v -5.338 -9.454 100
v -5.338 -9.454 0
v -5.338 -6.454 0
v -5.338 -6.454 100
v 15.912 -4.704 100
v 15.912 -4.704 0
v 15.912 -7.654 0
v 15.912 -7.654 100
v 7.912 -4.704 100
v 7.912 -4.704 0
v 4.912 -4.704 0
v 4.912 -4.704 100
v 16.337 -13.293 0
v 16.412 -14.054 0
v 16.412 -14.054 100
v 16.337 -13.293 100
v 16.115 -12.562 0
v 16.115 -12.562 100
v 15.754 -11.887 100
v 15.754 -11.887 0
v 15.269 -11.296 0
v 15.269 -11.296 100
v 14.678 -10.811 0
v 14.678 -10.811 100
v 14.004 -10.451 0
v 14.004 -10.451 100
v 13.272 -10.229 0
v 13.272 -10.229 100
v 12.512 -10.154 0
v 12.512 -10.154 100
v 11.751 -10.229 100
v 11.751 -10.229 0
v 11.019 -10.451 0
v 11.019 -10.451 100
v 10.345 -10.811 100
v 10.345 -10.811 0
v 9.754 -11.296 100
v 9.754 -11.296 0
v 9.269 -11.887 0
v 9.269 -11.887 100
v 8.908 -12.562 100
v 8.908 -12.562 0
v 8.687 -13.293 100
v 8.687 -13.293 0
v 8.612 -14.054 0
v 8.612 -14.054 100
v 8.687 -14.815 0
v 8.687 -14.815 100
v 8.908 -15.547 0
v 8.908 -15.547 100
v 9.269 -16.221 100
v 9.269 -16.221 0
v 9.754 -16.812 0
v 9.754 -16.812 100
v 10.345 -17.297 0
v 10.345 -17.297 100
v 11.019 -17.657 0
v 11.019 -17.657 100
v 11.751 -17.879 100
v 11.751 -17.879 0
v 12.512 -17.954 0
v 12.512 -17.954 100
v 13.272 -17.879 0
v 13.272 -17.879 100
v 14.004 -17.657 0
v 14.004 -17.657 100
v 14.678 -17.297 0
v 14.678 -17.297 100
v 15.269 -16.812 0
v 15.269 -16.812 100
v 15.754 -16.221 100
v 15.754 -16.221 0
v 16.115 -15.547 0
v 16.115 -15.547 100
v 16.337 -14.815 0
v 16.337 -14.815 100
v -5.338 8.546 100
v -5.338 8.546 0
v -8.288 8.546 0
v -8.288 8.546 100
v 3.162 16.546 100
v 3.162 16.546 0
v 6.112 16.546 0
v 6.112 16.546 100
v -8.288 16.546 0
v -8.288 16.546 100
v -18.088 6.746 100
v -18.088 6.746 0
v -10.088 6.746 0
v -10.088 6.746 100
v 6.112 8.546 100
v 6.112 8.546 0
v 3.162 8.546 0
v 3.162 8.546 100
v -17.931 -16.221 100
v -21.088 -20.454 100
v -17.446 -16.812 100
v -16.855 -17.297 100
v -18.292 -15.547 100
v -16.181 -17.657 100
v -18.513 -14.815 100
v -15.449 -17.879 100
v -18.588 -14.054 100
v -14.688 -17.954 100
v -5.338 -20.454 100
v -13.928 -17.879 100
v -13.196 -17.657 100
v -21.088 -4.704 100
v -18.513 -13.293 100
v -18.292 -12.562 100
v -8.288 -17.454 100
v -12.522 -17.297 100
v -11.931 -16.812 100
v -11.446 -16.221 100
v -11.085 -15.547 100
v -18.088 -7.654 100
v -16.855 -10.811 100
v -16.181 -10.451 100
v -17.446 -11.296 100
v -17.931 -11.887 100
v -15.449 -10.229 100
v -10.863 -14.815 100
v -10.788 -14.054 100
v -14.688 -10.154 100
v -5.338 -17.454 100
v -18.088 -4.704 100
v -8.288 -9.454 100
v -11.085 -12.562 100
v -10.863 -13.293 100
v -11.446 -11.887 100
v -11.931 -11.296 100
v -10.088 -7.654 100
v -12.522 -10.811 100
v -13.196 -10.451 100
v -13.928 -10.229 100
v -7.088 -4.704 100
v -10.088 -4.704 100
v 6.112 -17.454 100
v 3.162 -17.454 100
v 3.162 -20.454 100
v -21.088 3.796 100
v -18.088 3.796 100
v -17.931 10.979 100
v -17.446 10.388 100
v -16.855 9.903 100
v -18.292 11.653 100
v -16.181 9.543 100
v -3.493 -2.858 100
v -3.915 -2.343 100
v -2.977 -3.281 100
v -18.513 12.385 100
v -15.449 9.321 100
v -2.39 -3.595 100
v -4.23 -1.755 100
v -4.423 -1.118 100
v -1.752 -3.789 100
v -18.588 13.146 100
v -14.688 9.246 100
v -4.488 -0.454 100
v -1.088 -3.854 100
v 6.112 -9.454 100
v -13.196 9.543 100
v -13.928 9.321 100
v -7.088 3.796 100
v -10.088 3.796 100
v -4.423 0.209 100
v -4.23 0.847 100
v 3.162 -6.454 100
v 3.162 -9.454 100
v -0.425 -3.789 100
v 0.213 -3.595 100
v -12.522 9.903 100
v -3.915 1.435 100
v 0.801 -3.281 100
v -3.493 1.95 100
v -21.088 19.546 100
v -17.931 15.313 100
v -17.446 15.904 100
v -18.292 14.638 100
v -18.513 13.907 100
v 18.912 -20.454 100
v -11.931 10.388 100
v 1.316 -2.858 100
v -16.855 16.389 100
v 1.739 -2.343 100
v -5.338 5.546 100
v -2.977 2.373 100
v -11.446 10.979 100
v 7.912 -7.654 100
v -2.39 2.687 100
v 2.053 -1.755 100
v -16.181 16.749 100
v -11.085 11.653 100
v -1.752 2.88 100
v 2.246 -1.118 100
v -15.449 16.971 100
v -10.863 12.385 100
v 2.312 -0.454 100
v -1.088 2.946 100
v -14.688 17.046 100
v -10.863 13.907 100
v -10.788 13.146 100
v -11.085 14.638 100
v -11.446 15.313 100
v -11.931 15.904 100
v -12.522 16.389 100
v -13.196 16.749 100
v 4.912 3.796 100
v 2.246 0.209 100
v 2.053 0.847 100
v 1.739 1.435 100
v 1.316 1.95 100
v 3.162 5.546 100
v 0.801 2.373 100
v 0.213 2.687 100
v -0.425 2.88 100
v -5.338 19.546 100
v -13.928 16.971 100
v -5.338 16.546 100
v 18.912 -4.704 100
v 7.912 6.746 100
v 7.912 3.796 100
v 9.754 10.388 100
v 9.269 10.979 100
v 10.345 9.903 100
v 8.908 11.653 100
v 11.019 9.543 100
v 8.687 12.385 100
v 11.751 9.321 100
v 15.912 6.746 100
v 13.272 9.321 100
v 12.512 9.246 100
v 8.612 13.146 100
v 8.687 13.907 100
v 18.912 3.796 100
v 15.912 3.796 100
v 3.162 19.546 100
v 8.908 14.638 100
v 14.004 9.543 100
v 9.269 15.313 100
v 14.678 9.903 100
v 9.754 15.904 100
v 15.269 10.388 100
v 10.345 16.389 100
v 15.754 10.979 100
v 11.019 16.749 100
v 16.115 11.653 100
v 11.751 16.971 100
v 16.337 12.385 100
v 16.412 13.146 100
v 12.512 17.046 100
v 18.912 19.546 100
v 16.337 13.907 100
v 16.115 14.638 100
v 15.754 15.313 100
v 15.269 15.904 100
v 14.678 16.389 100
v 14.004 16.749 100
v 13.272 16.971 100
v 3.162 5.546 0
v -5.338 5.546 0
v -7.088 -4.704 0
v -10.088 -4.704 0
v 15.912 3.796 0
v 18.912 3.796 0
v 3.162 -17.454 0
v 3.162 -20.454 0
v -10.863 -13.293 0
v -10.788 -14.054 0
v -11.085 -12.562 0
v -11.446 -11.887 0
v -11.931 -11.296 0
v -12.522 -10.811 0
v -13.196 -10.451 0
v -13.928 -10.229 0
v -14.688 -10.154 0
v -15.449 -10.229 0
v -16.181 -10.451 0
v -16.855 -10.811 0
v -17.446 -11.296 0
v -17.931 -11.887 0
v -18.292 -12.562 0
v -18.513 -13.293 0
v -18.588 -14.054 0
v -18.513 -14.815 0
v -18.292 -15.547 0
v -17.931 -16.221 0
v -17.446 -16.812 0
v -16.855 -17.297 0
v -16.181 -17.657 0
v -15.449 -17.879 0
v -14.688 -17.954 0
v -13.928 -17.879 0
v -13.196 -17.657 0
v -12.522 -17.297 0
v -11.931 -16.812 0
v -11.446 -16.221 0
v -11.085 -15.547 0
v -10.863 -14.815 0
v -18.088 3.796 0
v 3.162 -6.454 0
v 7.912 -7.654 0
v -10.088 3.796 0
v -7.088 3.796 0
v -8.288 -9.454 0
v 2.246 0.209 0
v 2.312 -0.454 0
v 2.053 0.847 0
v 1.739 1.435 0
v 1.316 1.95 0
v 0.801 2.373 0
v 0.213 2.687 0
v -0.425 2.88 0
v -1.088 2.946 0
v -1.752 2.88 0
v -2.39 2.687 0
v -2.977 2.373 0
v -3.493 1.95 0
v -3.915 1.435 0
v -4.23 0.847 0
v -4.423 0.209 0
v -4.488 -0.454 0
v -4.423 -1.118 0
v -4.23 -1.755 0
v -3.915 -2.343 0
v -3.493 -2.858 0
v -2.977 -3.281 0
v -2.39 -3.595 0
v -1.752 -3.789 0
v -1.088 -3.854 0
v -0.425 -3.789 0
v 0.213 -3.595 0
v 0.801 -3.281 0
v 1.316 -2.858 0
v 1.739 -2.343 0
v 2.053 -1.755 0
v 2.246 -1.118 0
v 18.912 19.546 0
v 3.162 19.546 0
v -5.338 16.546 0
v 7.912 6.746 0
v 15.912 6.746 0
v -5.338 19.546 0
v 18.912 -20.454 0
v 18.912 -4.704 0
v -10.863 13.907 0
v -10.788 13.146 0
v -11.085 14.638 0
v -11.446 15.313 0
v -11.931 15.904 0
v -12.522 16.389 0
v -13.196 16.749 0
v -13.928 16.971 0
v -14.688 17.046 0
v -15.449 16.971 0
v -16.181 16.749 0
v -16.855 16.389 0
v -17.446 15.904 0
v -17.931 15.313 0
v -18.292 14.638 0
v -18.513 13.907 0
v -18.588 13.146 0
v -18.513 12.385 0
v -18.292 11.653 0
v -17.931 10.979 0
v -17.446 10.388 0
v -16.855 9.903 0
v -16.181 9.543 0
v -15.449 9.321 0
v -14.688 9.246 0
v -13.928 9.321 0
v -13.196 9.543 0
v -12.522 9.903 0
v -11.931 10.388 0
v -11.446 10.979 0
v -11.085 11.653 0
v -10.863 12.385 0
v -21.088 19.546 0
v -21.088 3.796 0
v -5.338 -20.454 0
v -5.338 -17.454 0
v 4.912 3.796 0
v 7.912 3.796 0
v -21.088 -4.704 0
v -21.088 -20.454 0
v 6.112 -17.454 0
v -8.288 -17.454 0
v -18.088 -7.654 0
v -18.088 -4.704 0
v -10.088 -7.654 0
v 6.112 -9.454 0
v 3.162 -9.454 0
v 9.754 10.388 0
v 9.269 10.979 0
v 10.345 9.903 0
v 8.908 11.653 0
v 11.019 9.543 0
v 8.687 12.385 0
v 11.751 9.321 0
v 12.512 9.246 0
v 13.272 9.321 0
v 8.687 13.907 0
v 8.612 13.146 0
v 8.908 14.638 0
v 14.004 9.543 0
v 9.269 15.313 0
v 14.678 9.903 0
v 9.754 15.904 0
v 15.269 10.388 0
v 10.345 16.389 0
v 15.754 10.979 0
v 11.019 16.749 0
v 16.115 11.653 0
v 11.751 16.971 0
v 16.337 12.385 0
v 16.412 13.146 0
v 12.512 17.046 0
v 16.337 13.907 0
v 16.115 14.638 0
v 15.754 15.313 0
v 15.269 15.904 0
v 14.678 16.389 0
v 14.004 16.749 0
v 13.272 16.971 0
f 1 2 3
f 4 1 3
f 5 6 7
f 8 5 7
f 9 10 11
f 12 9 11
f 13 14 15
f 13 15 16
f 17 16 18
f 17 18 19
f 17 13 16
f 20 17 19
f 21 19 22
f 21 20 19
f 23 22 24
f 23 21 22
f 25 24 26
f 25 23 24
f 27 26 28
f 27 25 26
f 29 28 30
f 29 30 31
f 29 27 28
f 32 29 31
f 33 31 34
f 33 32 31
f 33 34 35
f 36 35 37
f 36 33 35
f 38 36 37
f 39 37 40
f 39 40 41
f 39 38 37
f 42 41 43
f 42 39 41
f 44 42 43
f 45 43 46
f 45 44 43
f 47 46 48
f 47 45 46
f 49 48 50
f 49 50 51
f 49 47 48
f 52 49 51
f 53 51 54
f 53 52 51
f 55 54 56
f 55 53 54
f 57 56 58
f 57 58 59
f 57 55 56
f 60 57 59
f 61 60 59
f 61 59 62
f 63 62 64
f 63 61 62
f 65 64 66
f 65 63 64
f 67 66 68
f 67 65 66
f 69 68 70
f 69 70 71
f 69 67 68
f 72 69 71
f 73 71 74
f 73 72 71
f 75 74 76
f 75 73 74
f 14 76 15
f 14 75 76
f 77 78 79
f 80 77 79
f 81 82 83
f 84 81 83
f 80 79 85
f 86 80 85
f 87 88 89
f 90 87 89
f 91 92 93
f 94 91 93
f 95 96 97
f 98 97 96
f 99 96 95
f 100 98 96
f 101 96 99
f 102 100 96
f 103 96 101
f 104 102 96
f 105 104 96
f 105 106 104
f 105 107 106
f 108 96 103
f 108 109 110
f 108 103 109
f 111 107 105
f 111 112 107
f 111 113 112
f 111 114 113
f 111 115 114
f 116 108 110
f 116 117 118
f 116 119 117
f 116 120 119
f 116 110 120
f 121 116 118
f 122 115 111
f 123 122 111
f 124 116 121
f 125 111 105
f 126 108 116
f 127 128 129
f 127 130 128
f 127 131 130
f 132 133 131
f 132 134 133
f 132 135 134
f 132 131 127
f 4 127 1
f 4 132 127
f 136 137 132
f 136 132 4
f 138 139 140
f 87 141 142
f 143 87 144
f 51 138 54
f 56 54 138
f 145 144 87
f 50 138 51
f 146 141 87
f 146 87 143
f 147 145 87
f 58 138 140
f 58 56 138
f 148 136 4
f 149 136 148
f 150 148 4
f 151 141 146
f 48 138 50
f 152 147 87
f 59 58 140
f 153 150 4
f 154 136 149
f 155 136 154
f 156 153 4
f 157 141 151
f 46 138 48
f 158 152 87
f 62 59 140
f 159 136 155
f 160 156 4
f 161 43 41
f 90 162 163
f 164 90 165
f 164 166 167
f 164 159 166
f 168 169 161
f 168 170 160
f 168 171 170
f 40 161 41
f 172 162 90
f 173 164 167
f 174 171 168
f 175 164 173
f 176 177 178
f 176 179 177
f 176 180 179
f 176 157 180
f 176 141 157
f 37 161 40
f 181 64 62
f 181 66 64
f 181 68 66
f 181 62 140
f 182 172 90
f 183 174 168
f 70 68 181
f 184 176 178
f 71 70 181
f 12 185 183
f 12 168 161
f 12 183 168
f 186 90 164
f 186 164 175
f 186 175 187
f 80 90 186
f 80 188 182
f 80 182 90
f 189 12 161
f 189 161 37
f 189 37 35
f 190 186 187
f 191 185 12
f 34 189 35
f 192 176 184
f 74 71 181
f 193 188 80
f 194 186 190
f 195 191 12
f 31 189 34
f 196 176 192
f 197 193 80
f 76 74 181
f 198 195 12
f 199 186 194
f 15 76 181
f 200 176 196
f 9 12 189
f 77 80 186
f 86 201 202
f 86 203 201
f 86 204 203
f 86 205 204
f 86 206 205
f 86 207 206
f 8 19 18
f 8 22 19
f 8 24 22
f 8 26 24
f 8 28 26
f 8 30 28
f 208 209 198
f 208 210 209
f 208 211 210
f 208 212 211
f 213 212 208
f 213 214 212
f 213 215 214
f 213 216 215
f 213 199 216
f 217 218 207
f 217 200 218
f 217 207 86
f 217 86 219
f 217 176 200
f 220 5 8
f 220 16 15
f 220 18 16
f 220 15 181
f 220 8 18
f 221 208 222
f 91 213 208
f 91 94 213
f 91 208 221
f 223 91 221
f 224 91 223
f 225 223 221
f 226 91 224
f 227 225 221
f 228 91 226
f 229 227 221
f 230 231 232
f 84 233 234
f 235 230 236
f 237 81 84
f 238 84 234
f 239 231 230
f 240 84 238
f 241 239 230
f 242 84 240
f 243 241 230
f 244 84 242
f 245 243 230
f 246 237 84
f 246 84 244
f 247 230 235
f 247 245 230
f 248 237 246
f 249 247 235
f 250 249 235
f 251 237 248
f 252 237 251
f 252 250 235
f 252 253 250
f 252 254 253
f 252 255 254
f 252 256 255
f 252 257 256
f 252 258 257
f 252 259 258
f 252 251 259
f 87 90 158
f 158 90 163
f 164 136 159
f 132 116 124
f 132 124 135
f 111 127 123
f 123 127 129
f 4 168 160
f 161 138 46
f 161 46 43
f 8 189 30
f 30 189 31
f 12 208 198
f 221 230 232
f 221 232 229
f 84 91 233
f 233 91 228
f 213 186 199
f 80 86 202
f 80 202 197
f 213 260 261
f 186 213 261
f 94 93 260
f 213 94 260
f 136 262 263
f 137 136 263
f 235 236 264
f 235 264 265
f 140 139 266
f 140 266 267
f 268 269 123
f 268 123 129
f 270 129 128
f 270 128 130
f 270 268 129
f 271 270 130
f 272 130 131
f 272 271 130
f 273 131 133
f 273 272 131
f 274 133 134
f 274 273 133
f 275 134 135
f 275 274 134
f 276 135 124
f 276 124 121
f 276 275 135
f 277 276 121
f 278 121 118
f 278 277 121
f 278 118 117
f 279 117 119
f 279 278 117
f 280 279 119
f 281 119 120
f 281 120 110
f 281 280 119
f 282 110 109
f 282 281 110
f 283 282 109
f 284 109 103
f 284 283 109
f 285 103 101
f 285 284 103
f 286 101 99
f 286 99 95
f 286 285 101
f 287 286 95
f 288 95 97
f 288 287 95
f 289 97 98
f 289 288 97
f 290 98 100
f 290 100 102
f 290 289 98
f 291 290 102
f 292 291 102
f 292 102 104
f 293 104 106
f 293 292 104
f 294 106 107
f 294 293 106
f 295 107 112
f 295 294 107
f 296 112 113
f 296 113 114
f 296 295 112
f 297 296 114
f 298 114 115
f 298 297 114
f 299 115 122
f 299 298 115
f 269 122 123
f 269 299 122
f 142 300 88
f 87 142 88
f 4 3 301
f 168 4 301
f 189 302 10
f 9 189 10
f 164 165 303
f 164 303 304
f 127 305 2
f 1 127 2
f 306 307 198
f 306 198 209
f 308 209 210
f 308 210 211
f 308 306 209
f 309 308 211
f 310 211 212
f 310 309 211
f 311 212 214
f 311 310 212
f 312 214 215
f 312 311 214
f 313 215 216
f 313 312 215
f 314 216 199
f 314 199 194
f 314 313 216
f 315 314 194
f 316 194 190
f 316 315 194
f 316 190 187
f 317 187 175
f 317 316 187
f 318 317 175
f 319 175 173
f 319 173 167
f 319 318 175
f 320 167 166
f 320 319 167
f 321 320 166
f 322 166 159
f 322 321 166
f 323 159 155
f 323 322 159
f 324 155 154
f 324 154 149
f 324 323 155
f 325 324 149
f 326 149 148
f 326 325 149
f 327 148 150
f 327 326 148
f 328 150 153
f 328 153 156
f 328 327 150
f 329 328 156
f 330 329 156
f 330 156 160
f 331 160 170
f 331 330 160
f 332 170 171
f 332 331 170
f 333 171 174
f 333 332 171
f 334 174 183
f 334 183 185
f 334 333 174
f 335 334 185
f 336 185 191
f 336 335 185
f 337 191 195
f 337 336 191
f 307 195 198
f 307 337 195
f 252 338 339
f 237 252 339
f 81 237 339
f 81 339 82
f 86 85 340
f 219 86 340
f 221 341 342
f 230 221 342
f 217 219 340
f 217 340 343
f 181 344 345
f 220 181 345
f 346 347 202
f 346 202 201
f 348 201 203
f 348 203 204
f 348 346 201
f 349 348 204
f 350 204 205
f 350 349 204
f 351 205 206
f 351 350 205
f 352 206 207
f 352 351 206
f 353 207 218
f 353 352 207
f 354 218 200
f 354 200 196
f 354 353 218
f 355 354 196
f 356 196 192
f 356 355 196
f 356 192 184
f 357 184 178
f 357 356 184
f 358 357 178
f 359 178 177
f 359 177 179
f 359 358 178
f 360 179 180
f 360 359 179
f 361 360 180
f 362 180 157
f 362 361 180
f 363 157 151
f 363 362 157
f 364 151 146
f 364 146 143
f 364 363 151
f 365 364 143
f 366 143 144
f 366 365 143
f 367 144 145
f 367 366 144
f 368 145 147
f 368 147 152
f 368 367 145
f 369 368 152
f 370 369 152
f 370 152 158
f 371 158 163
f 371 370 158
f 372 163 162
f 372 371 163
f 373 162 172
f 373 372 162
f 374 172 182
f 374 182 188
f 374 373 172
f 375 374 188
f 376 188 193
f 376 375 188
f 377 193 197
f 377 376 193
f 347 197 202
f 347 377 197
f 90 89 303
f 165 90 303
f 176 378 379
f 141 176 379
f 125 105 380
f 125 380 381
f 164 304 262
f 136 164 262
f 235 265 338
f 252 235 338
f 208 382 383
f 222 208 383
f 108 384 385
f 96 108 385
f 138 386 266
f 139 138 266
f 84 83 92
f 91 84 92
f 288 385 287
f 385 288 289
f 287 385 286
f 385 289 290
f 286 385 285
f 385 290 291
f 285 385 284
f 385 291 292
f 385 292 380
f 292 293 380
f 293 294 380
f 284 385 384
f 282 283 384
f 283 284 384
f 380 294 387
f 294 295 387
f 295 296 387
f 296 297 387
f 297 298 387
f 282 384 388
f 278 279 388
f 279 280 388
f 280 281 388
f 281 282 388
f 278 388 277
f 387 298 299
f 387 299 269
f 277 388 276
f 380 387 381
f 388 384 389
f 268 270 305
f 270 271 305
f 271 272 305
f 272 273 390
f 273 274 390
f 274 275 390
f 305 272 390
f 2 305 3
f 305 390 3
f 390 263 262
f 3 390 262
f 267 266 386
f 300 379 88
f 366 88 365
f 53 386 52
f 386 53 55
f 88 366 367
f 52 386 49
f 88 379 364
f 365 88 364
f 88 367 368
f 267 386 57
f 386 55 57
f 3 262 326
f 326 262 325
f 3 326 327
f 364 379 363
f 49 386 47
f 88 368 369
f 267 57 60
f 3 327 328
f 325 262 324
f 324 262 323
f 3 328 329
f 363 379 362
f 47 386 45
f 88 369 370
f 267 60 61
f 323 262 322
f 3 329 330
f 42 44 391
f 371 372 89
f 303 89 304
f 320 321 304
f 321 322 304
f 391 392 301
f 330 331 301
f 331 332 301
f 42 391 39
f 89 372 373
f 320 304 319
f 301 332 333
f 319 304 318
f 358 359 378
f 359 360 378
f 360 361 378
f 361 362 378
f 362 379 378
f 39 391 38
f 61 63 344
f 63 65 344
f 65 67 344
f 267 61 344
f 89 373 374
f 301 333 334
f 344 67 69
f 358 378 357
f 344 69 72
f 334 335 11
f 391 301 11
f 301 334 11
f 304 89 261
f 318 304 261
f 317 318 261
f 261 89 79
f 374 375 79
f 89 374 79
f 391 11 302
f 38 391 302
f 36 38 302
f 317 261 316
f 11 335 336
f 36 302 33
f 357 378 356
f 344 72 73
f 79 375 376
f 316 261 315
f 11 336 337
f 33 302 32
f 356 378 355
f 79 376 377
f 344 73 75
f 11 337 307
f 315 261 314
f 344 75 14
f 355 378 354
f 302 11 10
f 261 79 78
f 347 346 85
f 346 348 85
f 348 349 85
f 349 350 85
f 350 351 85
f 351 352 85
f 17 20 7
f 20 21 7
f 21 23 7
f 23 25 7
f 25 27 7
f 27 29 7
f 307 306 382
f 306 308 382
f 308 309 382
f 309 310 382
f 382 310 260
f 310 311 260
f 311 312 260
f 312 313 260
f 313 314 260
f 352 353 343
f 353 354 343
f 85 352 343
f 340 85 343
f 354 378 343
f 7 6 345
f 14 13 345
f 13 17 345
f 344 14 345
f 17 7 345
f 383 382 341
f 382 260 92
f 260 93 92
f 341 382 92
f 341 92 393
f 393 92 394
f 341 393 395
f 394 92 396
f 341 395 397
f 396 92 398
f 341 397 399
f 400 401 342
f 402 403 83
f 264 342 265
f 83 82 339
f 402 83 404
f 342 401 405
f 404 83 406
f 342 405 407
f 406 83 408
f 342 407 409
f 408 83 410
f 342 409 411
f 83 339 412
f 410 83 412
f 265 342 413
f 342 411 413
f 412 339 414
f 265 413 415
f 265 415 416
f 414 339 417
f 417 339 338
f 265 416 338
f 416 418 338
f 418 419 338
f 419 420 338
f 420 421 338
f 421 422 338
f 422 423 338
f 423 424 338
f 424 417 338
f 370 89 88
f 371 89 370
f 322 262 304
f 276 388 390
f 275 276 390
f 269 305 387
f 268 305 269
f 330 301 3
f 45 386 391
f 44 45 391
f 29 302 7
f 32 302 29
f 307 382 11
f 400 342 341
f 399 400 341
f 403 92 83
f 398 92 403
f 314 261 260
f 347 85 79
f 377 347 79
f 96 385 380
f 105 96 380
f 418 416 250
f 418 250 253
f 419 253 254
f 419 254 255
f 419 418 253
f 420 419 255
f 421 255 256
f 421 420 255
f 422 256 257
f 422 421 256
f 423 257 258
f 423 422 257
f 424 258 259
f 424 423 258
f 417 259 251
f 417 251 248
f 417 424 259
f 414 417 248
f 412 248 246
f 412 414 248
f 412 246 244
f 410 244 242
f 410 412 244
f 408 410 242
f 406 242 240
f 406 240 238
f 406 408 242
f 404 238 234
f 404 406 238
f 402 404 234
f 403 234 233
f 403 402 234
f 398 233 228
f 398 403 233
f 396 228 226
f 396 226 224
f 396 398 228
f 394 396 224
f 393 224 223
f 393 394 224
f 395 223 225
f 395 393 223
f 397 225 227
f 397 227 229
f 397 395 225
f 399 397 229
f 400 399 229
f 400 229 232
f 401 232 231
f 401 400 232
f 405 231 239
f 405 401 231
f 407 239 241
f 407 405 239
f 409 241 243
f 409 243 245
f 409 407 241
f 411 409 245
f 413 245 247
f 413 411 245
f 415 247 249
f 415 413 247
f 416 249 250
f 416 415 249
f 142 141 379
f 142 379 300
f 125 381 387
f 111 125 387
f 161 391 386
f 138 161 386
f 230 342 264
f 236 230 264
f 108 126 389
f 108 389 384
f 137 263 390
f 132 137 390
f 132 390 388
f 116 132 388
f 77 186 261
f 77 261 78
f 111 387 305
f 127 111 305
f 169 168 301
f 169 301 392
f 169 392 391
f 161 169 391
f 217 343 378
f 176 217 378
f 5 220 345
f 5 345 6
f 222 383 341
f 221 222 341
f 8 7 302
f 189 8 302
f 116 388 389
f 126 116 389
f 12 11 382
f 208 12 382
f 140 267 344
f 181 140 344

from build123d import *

# Parameters (mm, degrees)
SKETCH_1_R      = 3.9
SKETCH_1_R_2    = 3.4
EXTRUDE_1_DEPTH = 100


with BuildPart() as part:
    # 草图1 → 凸台-拉伸1 (new body)
    with BuildSketch(Plane.XY):
        Polygon((-5.338418149, 19.545792426), (-21.088418149, 19.545792426), (-21.088418149, 3.795792426), (-18.088418149, 3.795792426), (-18.088418149, 6.745792426), (-10.088418149, 6.745792426), (-10.088418149, 3.795792426), (-7.088418149, 3.795792426), (-7.088418149, -4.704207574), (-10.088418149, -4.704207574), (-10.088418149, -7.654207574), (-18.088418149, -7.654207574), (-18.088418149, -4.704207574), (-21.088418149, -4.704207574), (-21.088418149, -20.454207574), (-5.338418149, -20.454207574), (-5.338418149, -17.454207574), (-8.288418149, -17.454207574), (-8.288418149, -9.454207574), (-5.338418149, -9.454207574), (-5.338418149, -6.454207574), (3.161581851, -6.454207574), (3.161581851, -9.454207574), (6.111581851, -9.454207574), (6.111581851, -17.454207574), (3.161581851, -17.454207574), (3.161581851, -20.454207574), (18.911581851, -20.454207574), (18.911581851, -4.704207574), (15.911581851, -4.704207574), (15.911581851, -7.654207574), (7.911581851, -7.654207574), (7.911581851, -4.704207574), (4.911581851, -4.704207574), (4.911581851, 3.795792426), (7.911581851, 3.795792426), (7.911581851, 6.745792426), (15.911581851, 6.745792426), (15.911581851, 3.795792426), (18.911581851, 3.795792426), (18.911581851, 19.545792426), (3.161581851, 19.545792426), (3.161581851, 16.545792426), (6.111581851, 16.545792426), (6.111581851, 8.545792426), (3.161581851, 8.545792426), (3.161581851, 5.545792426), (-5.338418149, 5.545792426), (-5.338418149, 8.545792426), (-8.288418149, 8.545792426), (-8.288418149, 16.545792426), (-5.338418149, 16.545792426), align=None)
        with Locations((-14.688418149, 13.145792426)):
            Circle(SKETCH_1_R, mode=Mode.SUBTRACT)
        with Locations((12.511581851, 13.145792426)):
            Circle(SKETCH_1_R, mode=Mode.SUBTRACT)
        with Locations((-14.688418149, -14.054207574)):
            Circle(SKETCH_1_R, mode=Mode.SUBTRACT)
        with Locations((12.511581851, -14.054207574)):
            Circle(SKETCH_1_R, mode=Mode.SUBTRACT)
        with Locations((-1.088418149, -0.454207574)):
            Circle(SKETCH_1_R_2, mode=Mode.SUBTRACT)
    extrude(amount=EXTRUDE_1_DEPTH)


solid = part.part
